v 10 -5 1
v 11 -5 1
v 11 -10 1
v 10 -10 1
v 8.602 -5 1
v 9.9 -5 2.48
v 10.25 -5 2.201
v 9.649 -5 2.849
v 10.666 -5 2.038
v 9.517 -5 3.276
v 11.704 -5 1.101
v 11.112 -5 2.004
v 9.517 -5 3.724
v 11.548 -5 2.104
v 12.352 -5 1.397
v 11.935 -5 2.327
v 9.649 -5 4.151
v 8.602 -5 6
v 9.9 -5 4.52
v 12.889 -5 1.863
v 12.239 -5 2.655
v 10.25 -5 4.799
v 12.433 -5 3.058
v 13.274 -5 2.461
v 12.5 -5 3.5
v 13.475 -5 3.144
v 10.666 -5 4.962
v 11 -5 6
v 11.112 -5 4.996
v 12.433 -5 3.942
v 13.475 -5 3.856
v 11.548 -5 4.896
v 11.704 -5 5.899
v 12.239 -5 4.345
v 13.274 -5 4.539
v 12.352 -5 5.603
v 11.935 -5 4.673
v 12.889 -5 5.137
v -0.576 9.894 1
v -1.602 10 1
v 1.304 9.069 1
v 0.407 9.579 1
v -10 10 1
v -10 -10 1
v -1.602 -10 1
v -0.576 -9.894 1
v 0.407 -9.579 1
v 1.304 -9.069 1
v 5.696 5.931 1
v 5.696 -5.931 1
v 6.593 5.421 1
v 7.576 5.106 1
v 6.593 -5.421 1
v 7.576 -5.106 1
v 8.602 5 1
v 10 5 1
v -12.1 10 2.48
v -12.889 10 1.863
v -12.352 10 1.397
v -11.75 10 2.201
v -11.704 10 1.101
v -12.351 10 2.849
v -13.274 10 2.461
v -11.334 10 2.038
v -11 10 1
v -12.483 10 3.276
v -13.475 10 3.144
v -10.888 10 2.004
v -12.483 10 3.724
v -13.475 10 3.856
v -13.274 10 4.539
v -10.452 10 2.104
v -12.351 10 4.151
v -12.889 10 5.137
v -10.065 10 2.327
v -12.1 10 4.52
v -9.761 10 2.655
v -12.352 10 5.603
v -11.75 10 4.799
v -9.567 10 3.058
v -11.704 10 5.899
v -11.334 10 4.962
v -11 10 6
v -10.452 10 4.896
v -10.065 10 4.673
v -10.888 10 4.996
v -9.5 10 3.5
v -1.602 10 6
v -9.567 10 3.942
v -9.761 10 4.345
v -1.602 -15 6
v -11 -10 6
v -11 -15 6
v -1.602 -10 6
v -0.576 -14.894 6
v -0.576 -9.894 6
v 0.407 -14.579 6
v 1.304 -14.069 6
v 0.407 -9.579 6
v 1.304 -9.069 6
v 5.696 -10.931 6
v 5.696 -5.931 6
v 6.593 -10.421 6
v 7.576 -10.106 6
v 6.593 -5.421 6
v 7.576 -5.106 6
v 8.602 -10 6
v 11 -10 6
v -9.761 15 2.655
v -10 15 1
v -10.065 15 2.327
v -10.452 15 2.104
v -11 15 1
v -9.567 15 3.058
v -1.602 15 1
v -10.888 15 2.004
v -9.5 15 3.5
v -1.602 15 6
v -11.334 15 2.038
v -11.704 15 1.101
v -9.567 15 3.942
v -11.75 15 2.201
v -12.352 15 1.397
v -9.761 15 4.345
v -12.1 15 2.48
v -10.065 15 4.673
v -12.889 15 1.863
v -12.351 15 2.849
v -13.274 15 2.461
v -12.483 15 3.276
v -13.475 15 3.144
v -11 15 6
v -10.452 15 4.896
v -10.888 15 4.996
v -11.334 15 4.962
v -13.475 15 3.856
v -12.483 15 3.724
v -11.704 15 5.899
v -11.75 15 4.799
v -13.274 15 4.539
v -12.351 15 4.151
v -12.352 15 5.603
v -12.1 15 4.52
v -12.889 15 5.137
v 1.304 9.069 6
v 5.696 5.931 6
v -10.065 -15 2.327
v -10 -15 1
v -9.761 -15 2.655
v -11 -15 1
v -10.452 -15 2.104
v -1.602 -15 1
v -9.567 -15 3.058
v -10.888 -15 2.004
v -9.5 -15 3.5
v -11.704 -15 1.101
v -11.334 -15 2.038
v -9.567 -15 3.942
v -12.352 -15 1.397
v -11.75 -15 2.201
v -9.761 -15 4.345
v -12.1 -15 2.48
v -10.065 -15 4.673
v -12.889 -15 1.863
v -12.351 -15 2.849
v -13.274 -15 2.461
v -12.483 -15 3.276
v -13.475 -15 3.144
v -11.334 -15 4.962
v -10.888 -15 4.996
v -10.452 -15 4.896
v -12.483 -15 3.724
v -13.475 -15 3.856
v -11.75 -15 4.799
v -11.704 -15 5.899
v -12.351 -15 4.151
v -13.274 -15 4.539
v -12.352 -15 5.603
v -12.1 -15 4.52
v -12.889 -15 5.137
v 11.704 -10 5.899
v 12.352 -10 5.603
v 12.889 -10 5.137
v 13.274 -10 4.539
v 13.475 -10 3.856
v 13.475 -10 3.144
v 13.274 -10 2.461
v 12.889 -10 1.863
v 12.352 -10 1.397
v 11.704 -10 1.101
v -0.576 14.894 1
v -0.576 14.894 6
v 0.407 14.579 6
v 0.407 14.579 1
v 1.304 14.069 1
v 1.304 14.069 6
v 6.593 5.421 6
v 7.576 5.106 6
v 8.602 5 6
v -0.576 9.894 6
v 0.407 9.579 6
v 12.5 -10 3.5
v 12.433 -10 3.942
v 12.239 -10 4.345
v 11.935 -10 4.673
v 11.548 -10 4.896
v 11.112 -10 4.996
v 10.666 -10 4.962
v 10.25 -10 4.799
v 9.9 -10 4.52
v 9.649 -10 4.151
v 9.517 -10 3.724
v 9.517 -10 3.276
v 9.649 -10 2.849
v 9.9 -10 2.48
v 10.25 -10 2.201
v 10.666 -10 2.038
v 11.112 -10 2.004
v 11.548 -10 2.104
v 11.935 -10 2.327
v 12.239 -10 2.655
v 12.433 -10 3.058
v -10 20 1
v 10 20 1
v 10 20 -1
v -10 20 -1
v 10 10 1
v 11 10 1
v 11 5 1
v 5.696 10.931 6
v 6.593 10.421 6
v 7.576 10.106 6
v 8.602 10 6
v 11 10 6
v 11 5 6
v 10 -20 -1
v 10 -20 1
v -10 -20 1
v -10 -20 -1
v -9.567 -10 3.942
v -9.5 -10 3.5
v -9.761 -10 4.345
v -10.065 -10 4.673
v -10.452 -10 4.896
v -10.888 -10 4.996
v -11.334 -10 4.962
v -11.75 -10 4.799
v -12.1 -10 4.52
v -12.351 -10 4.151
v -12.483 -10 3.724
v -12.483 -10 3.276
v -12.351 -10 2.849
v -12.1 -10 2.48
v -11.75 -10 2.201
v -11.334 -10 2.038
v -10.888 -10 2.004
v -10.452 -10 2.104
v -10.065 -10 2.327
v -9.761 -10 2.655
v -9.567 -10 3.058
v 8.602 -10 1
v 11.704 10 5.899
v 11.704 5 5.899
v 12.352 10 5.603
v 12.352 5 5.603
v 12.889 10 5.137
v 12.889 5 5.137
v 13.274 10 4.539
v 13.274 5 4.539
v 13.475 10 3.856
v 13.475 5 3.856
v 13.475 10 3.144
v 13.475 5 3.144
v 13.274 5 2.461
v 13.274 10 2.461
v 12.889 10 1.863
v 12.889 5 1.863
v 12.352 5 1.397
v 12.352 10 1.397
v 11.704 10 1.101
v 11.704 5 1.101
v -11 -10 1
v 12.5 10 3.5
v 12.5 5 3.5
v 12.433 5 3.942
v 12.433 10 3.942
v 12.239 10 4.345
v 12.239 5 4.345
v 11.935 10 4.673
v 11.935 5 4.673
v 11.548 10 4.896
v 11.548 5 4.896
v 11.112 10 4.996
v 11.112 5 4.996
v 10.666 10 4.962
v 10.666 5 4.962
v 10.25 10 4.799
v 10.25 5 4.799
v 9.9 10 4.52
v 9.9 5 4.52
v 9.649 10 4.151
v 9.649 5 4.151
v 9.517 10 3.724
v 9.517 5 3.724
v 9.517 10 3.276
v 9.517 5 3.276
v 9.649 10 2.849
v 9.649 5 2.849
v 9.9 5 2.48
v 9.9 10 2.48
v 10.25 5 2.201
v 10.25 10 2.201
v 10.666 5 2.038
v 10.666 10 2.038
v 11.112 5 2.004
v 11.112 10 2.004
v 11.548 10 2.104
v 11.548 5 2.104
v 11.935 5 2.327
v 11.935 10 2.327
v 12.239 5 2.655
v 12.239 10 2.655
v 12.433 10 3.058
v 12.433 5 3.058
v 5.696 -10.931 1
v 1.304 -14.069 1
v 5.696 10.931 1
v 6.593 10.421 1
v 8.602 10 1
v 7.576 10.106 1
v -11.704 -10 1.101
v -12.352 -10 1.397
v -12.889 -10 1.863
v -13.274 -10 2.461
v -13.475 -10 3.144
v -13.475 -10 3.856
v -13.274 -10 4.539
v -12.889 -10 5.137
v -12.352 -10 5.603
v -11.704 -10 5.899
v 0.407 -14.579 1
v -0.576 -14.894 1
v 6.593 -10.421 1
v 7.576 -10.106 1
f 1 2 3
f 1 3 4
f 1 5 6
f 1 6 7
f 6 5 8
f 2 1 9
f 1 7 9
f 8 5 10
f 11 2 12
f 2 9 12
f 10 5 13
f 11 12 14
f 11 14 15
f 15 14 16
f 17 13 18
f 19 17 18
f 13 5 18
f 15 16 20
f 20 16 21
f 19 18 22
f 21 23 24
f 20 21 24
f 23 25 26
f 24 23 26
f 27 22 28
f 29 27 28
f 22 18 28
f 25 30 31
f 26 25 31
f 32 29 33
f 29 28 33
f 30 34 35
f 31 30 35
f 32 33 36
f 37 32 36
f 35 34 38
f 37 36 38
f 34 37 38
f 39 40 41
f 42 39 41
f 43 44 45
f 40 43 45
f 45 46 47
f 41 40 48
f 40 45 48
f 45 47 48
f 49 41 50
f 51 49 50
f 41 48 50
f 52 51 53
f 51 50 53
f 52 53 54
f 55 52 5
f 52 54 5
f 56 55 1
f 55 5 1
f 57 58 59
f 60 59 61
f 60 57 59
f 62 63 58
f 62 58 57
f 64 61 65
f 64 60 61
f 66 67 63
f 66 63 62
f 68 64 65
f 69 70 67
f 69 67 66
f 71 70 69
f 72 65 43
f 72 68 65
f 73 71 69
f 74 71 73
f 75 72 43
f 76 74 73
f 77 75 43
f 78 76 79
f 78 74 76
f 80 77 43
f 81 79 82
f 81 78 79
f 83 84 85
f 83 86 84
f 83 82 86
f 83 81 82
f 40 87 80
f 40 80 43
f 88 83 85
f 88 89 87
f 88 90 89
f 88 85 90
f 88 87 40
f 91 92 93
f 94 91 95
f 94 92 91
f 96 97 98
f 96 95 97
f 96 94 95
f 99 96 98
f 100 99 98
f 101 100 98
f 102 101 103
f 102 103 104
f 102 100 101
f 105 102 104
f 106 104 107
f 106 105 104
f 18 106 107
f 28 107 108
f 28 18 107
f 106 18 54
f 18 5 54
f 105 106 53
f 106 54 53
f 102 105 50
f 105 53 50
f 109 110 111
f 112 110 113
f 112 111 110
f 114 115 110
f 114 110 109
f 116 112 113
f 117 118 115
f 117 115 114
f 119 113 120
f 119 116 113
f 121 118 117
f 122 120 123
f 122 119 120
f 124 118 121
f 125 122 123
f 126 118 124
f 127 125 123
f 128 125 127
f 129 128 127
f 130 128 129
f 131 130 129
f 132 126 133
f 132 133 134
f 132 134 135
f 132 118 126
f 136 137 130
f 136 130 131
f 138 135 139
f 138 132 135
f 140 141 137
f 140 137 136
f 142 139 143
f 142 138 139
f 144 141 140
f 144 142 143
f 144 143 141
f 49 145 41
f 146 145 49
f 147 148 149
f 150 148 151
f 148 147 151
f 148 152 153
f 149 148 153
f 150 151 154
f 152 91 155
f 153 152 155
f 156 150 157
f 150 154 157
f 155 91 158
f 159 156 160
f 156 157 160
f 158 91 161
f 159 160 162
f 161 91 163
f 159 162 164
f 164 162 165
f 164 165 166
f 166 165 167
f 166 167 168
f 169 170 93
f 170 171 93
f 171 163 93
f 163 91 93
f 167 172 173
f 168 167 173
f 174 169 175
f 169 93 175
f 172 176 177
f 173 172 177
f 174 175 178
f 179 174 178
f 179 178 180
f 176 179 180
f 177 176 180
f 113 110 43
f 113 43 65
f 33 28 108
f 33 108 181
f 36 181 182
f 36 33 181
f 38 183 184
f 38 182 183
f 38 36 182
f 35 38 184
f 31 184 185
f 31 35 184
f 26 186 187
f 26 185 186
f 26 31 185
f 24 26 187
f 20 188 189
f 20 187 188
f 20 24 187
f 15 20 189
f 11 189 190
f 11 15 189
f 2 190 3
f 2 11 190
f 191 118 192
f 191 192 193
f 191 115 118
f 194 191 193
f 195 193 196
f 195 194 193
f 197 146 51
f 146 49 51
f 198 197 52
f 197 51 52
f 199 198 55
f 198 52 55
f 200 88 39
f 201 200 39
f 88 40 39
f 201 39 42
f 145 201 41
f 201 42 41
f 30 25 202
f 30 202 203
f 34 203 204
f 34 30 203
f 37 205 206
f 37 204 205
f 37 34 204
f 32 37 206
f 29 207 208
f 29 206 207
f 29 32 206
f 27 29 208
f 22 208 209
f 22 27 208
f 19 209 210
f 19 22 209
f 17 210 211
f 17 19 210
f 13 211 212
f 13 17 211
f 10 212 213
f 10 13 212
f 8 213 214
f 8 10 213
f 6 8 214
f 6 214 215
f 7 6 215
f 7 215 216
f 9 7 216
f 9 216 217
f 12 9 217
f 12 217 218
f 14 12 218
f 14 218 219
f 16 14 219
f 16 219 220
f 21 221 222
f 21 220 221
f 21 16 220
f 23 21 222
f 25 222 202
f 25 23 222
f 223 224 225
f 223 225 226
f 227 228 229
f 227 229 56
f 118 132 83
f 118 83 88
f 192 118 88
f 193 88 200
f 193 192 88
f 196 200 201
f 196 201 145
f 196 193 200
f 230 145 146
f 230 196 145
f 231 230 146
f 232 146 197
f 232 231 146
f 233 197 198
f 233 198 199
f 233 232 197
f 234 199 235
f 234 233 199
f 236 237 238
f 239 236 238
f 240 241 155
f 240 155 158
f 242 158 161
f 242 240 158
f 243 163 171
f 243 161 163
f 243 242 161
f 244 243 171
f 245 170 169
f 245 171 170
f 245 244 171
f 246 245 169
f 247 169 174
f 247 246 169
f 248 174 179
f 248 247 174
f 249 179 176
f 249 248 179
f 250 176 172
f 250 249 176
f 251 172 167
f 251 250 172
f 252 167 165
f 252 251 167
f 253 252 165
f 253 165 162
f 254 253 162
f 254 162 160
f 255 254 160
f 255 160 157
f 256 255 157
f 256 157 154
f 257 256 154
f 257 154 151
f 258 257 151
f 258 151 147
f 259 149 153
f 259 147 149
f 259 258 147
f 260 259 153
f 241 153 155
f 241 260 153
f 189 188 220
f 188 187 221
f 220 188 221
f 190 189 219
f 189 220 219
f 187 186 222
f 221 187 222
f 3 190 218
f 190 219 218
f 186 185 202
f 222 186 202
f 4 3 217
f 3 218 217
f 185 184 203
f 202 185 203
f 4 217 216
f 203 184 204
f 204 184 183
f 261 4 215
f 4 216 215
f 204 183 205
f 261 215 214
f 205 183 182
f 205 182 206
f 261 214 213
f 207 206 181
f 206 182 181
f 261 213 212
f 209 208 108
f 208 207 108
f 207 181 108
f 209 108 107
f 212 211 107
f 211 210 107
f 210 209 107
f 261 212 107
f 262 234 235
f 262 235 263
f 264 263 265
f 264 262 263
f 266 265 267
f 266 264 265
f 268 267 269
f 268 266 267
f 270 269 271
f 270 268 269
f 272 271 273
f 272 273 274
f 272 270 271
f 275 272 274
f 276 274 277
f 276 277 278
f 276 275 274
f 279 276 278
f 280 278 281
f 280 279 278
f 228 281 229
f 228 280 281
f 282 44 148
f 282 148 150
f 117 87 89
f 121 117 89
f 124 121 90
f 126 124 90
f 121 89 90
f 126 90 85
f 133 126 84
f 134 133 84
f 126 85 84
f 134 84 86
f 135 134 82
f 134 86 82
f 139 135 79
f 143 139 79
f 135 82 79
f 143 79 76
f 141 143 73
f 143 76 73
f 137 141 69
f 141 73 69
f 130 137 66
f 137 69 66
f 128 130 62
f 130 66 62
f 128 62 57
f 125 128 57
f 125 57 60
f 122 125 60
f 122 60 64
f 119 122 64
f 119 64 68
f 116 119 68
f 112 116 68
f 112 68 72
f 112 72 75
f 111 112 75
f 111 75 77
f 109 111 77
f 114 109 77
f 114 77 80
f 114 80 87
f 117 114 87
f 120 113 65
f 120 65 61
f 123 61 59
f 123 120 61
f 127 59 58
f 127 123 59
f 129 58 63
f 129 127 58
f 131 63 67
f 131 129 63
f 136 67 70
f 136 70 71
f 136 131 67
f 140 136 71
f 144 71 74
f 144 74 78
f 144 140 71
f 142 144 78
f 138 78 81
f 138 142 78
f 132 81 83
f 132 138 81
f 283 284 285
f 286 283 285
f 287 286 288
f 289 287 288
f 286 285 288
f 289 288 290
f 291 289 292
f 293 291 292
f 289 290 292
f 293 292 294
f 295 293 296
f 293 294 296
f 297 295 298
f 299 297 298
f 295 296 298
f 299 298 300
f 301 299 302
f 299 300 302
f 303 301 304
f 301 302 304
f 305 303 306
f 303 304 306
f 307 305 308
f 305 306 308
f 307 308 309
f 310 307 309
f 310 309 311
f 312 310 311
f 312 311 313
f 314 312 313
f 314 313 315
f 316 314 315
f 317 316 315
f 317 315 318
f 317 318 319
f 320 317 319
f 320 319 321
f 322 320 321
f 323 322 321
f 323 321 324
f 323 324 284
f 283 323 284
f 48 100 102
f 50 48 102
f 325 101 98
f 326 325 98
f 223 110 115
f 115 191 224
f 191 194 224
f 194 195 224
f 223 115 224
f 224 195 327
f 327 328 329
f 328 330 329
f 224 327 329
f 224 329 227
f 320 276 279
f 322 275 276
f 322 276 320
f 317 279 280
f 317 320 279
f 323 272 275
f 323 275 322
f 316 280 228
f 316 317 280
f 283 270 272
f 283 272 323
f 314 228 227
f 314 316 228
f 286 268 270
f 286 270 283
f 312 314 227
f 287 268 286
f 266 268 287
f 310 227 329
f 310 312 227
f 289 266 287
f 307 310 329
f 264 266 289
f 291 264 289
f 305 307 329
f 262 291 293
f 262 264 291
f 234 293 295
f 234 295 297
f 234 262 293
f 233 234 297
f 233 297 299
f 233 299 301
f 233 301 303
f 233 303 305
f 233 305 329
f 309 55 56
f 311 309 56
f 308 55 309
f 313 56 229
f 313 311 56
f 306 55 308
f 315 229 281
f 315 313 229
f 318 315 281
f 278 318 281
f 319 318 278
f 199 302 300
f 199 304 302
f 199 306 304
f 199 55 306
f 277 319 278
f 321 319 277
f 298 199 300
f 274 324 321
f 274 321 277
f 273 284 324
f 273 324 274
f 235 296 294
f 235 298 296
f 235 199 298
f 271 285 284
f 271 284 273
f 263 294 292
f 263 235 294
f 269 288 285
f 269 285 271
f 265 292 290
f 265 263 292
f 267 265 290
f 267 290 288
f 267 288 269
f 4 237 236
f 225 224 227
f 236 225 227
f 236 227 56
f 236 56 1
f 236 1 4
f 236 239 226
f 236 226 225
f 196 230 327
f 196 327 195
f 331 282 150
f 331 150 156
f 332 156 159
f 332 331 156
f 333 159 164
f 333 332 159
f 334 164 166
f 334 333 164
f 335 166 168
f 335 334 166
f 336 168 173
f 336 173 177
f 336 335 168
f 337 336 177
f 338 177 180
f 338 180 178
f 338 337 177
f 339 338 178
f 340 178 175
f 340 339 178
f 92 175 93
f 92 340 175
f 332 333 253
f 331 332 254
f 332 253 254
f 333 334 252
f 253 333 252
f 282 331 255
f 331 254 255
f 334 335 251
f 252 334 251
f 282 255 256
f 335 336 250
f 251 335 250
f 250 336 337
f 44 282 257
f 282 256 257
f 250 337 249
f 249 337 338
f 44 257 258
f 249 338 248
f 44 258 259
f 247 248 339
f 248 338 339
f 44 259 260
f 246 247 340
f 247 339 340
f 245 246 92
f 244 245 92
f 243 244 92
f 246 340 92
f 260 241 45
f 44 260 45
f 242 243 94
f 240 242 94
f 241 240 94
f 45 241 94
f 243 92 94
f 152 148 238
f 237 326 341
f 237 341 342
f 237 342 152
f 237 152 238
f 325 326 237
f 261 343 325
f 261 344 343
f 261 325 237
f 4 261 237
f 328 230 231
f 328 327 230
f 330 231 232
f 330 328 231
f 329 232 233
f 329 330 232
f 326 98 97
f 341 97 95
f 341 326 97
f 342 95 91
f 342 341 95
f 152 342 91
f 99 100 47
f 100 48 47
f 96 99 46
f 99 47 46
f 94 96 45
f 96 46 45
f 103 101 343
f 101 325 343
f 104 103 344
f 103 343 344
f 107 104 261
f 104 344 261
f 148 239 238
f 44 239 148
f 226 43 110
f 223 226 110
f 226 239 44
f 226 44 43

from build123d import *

# Parameters (mm, degrees)
F0_W          = 20
F0_H          = 1
F1_DEPTH      = 20
F1_DEPTH_BACK = 20
F3_DEPTH      = 40
F5_DEPTH      = 5
F7_R          = 1.5
F8_DEPTH      = 20.001
F8_DEPTH_BACK = 20.001
F9_R          = 5


# Not quite as in the source:
# - a pattern or mirror of a feature is missing from the dataset's text; its kind, count and spacing are read off the source's solid


with BuildPart() as f1:
    # F0 (on Front) → F1 (new body, two sides)
    with BuildSketch(Plane.XZ) as f1_sk:
        with Locations((0, -0.5)):
            Rectangle(F0_W, F0_H)
    extrude(amount=F1_DEPTH)
    extrude(f1_sk.sketch, amount=-F1_DEPTH_BACK)

    # F2 (on face) → F3 (join, through all)
    with BuildSketch(Plane(origin=(0, 20, 0), x_dir=(-1, 0, 0), z_dir=(0, 1, 0))):
        with BuildLine():
            Line((10, 1), (11, 1))
            ThreePointArc((11, 1), (13.5, 3.5), (11, 6))
            Line((11, 6), (0, 6))
            Line((0, 6), (-11, 6))
            ThreePointArc((-11, 6), (-13.5, 3.5), (-11, 1))
            Line((-11, 1), (-10, 1))
            Line((-10, 1), (-10, 0))
            Line((-10, 0), (0, 0))
            Line((0, 0), (10, 0))
            Line((10, 0), (10, 1))
        make_face()
    extrude(amount=-F3_DEPTH)

    # F4 (on face) → F5 (cut, through all)
    with BuildSketch(Plane.XY.offset(6)):
        Polygon((0, -15), (-13.5, -15), (-13.5, -20), (13.5, -20), (13.5, -10), (7, -10), align=None)
        Polygon((-13.5, 0), (-13.5, -10), (0, -10), (7, -5), (13.5, -5), (13.5, 0), align=None)
    f5 = extrude(amount=-F5_DEPTH, mode=Mode.SUBTRACT)

    # F5_copies: F5 across plane
    add(f5.mirror(Plane.ZX), mode=Mode.SUBTRACT)

    # F7 (on offset) → F8 (cut, two sides)
    with BuildSketch(Plane.XZ) as f8_sk:
        with Locations((11, 3.5)):
            Circle(F7_R)
        with Locations((-11, 3.5)):
            Circle(F7_R)
    extrude(amount=-F8_DEPTH, mode=Mode.SUBTRACT)
    extrude(f8_sk.sketch, amount=F8_DEPTH_BACK, mode=Mode.SUBTRACT)

    # F9
    f9_edges = [f1.edges().sort_by_distance(p)[0] for p in [
        (0, -15, 3.5),
        (0, -10, 3.5),
        (7, -5, 3.5),
        (7, -10, 3.5),
        (7, 10, 3.5),
        (0, 15, 3.5),
        (0, 10, 3.5),
        (7, 5, 3.5),
    ]]
    fillet(f9_edges, radius=F9_R)


solid = f1.part
